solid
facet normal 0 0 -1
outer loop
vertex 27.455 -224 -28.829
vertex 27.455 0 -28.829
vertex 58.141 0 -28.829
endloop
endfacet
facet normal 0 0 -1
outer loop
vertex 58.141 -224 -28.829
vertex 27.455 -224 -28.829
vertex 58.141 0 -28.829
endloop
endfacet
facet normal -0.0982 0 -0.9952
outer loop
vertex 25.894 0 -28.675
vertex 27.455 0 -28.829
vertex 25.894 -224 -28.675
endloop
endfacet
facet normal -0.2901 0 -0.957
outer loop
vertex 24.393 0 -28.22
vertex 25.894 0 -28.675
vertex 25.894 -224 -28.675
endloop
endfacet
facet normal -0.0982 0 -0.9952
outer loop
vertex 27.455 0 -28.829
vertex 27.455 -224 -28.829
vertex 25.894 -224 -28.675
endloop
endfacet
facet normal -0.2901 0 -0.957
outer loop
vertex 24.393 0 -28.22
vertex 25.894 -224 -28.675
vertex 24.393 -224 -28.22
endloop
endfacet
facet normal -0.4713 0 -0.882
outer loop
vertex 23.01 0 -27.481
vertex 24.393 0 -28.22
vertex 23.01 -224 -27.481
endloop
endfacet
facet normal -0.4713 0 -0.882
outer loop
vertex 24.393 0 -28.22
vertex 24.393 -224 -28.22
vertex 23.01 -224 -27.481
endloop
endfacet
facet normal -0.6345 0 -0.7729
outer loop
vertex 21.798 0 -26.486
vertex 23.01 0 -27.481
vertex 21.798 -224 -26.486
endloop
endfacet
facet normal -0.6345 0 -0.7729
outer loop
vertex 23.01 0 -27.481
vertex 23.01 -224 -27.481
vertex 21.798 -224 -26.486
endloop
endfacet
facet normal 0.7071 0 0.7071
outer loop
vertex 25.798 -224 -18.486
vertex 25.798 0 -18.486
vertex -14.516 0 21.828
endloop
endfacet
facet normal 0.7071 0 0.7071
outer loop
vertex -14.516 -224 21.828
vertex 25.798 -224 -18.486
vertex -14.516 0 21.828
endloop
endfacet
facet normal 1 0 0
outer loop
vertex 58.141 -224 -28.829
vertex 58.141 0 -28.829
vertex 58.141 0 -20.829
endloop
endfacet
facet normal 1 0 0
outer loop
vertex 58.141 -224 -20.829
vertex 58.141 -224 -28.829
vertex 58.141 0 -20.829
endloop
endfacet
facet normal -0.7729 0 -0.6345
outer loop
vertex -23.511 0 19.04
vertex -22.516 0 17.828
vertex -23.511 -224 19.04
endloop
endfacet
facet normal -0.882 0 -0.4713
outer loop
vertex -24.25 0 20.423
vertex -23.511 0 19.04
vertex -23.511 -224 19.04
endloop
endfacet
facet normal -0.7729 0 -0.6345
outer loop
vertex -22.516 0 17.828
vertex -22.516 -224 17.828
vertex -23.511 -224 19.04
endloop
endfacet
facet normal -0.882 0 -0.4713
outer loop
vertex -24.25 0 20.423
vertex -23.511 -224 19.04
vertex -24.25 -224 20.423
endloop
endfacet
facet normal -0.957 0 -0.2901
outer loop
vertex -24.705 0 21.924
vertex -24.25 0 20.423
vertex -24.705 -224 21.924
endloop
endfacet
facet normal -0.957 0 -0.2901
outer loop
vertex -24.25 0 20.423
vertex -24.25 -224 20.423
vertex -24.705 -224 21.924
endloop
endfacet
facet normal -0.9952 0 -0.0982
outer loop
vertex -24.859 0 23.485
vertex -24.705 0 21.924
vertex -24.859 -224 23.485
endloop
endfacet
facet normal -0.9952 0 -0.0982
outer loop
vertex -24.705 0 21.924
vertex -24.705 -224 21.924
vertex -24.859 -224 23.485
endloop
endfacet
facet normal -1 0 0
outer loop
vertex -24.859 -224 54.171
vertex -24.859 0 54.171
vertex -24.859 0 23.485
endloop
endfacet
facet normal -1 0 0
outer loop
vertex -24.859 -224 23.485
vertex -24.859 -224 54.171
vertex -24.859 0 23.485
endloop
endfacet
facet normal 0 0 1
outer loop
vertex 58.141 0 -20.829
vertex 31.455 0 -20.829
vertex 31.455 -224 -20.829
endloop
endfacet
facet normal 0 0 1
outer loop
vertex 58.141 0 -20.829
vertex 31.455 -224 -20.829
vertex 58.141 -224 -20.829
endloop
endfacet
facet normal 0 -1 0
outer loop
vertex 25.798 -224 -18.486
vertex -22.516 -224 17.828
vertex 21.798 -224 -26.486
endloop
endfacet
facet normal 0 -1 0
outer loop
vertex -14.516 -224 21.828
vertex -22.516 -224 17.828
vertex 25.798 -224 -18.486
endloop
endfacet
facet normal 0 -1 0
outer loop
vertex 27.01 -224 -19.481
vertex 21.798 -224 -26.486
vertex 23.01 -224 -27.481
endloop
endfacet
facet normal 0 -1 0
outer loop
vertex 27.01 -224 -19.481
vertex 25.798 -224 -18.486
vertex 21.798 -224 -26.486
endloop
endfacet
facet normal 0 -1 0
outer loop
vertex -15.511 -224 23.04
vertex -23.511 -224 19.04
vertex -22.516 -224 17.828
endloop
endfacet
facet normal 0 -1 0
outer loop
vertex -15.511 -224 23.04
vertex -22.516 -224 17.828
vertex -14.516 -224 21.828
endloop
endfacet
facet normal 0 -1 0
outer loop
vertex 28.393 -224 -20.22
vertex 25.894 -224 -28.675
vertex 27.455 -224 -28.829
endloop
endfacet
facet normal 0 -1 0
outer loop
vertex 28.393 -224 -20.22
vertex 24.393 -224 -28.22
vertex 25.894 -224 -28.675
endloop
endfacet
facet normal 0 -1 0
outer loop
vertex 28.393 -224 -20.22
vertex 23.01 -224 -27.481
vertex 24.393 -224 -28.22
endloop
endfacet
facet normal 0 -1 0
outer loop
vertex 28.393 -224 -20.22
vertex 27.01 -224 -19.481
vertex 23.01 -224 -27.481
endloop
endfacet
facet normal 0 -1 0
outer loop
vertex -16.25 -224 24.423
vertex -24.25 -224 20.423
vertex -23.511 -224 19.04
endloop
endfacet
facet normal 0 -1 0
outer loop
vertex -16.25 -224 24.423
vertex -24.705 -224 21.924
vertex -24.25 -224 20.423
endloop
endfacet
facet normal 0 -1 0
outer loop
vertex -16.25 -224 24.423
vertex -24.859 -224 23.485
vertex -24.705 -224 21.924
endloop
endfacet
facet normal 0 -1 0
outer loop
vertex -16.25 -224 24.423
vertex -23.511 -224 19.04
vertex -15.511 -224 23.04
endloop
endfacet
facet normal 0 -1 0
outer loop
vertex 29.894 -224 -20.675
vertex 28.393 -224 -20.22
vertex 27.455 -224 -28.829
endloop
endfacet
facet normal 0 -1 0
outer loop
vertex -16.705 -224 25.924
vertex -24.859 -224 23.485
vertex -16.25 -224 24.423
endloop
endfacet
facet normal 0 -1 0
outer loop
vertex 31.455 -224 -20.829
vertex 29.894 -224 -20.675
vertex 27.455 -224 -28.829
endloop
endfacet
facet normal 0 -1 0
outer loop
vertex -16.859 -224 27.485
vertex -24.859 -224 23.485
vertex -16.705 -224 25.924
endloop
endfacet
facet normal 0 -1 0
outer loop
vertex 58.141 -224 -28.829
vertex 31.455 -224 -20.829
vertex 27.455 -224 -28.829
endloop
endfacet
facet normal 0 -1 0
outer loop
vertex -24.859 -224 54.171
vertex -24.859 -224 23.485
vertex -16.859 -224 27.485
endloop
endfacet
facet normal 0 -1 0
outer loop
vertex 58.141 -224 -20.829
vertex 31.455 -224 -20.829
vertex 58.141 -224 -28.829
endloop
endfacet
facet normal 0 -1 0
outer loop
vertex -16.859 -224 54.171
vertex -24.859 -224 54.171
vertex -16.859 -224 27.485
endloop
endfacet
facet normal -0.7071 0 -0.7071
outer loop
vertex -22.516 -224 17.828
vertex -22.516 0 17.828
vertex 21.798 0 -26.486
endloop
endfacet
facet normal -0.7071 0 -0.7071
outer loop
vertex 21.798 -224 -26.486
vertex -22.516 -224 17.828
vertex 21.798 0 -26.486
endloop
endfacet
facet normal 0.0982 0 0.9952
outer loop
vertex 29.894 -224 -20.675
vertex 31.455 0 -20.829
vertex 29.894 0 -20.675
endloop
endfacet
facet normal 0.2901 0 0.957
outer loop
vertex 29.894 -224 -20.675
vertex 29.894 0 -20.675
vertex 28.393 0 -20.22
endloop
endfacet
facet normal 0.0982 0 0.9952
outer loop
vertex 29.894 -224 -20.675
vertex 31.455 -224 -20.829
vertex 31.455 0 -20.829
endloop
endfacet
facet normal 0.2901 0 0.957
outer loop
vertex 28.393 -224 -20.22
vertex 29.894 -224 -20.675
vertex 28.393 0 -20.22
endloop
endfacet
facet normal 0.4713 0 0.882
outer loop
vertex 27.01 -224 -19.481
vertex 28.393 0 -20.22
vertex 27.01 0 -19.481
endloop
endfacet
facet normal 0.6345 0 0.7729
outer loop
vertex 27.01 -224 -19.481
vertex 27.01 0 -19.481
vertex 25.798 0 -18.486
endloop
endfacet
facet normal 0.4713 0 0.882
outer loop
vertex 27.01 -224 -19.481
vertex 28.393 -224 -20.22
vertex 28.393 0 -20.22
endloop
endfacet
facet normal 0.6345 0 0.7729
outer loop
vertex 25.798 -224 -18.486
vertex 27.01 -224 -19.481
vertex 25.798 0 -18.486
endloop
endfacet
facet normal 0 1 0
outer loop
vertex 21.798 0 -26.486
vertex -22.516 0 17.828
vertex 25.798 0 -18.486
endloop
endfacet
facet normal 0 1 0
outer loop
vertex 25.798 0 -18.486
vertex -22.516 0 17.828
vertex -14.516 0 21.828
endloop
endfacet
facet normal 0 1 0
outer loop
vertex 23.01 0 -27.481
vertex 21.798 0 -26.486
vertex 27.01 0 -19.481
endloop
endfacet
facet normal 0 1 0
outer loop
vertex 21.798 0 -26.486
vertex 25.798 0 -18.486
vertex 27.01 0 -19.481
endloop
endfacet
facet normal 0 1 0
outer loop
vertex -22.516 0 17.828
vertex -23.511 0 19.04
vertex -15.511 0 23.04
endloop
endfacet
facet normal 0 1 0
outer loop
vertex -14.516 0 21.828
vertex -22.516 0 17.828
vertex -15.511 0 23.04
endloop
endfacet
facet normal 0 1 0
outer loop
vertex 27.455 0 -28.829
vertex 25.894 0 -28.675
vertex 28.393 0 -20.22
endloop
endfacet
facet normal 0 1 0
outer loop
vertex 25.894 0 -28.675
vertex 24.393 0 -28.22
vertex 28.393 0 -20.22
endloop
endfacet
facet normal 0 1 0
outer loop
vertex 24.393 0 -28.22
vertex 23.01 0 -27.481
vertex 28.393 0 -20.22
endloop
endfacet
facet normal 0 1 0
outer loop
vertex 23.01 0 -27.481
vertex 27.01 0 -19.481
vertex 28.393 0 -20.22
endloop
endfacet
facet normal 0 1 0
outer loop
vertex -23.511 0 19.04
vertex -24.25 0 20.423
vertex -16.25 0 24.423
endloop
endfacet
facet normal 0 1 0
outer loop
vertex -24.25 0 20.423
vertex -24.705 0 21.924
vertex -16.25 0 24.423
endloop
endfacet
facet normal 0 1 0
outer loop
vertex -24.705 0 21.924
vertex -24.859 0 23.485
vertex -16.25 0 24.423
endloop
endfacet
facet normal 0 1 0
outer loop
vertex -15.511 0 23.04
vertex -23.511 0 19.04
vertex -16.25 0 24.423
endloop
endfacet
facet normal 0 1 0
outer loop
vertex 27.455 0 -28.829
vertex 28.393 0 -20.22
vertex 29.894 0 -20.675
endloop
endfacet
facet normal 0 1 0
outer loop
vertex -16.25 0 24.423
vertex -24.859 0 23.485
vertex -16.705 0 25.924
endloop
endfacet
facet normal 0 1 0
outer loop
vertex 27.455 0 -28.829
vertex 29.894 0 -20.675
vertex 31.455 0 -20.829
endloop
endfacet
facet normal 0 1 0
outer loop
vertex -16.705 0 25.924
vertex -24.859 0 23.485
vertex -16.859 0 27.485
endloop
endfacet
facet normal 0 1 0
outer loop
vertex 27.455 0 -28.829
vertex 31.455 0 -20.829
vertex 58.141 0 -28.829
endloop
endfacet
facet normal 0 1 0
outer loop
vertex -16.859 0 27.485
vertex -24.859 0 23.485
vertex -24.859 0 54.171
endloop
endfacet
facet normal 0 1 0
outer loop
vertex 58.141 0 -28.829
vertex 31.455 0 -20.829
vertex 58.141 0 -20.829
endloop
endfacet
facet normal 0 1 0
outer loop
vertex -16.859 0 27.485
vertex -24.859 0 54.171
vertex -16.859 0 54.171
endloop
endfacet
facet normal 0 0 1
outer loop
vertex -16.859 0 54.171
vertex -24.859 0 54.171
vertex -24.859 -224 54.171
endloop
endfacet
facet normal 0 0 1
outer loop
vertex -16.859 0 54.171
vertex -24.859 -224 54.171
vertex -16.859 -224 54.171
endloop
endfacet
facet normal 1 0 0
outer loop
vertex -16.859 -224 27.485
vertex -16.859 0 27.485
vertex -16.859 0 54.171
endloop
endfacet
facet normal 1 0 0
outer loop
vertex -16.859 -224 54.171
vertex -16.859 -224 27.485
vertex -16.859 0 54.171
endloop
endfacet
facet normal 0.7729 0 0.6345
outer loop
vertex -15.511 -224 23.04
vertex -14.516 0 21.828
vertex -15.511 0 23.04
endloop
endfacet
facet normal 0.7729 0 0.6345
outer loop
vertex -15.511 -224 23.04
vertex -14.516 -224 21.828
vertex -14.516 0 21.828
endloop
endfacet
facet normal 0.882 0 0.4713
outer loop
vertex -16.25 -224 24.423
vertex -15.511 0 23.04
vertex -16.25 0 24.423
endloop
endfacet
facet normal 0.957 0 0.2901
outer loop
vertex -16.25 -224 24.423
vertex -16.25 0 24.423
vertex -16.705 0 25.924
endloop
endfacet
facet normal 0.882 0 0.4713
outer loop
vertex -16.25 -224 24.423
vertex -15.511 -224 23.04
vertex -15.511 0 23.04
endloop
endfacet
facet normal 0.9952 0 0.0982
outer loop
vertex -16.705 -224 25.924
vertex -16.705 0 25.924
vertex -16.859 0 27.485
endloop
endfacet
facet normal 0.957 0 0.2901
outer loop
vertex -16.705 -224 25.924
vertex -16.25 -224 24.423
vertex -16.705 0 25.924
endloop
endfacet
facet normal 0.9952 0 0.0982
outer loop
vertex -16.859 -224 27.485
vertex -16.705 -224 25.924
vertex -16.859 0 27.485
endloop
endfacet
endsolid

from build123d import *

# Parameters (mm, degrees)
F0_W     = 8
F0_H     = 30
F0_W_2   = 30
F0_H_2   = 8
F1_DEPTH = 224
F2_R     = 8
F3_R     = 8


with BuildPart() as f1:
    # F0 (on Front) → F1 (new body)
    with BuildSketch(Plane.XZ):
        with Locations((-20.8588695079, 39.1709680259)):
            Rectangle(F0_W, F0_H)
        Polygon((-16.8588695079, 24.1709680259), (-24.8588695079, 24.1709680259), (-24.8588695079, 20.1709680259), align=None)
        Polygon((28.1411304921, -20.8290319741), (-16.8588695079, 24.1709680259), (-24.8588695079, 20.1709680259), (24.1411304921, -28.8290319741), align=None)
        with Locations((43.1411304921, -24.8290319741)):
            Rectangle(F0_W_2, F0_H_2)
        Polygon((28.1411304921, -28.8290319741), (28.1411304921, -20.8290319741), (24.1411304921, -28.8290319741), align=None)
    extrude(amount=F1_DEPTH)

    # F2
    f2_edges = [f1.edges().sort_by_distance(p)[0] for p in [
        (-16.85887, -112, 24.170968),
        (28.14113, -112, -20.829032),
    ]]
    fillet(f2_edges, radius=F2_R)

    # F3
    f3_edges = [f1.edges().sort_by_distance(p)[0] for p in [
        (-24.85887, -112, 20.170968),
        (24.14113, -112, -28.829032),
    ]]
    fillet(f3_edges, radius=F3_R)


solid = f1.part
